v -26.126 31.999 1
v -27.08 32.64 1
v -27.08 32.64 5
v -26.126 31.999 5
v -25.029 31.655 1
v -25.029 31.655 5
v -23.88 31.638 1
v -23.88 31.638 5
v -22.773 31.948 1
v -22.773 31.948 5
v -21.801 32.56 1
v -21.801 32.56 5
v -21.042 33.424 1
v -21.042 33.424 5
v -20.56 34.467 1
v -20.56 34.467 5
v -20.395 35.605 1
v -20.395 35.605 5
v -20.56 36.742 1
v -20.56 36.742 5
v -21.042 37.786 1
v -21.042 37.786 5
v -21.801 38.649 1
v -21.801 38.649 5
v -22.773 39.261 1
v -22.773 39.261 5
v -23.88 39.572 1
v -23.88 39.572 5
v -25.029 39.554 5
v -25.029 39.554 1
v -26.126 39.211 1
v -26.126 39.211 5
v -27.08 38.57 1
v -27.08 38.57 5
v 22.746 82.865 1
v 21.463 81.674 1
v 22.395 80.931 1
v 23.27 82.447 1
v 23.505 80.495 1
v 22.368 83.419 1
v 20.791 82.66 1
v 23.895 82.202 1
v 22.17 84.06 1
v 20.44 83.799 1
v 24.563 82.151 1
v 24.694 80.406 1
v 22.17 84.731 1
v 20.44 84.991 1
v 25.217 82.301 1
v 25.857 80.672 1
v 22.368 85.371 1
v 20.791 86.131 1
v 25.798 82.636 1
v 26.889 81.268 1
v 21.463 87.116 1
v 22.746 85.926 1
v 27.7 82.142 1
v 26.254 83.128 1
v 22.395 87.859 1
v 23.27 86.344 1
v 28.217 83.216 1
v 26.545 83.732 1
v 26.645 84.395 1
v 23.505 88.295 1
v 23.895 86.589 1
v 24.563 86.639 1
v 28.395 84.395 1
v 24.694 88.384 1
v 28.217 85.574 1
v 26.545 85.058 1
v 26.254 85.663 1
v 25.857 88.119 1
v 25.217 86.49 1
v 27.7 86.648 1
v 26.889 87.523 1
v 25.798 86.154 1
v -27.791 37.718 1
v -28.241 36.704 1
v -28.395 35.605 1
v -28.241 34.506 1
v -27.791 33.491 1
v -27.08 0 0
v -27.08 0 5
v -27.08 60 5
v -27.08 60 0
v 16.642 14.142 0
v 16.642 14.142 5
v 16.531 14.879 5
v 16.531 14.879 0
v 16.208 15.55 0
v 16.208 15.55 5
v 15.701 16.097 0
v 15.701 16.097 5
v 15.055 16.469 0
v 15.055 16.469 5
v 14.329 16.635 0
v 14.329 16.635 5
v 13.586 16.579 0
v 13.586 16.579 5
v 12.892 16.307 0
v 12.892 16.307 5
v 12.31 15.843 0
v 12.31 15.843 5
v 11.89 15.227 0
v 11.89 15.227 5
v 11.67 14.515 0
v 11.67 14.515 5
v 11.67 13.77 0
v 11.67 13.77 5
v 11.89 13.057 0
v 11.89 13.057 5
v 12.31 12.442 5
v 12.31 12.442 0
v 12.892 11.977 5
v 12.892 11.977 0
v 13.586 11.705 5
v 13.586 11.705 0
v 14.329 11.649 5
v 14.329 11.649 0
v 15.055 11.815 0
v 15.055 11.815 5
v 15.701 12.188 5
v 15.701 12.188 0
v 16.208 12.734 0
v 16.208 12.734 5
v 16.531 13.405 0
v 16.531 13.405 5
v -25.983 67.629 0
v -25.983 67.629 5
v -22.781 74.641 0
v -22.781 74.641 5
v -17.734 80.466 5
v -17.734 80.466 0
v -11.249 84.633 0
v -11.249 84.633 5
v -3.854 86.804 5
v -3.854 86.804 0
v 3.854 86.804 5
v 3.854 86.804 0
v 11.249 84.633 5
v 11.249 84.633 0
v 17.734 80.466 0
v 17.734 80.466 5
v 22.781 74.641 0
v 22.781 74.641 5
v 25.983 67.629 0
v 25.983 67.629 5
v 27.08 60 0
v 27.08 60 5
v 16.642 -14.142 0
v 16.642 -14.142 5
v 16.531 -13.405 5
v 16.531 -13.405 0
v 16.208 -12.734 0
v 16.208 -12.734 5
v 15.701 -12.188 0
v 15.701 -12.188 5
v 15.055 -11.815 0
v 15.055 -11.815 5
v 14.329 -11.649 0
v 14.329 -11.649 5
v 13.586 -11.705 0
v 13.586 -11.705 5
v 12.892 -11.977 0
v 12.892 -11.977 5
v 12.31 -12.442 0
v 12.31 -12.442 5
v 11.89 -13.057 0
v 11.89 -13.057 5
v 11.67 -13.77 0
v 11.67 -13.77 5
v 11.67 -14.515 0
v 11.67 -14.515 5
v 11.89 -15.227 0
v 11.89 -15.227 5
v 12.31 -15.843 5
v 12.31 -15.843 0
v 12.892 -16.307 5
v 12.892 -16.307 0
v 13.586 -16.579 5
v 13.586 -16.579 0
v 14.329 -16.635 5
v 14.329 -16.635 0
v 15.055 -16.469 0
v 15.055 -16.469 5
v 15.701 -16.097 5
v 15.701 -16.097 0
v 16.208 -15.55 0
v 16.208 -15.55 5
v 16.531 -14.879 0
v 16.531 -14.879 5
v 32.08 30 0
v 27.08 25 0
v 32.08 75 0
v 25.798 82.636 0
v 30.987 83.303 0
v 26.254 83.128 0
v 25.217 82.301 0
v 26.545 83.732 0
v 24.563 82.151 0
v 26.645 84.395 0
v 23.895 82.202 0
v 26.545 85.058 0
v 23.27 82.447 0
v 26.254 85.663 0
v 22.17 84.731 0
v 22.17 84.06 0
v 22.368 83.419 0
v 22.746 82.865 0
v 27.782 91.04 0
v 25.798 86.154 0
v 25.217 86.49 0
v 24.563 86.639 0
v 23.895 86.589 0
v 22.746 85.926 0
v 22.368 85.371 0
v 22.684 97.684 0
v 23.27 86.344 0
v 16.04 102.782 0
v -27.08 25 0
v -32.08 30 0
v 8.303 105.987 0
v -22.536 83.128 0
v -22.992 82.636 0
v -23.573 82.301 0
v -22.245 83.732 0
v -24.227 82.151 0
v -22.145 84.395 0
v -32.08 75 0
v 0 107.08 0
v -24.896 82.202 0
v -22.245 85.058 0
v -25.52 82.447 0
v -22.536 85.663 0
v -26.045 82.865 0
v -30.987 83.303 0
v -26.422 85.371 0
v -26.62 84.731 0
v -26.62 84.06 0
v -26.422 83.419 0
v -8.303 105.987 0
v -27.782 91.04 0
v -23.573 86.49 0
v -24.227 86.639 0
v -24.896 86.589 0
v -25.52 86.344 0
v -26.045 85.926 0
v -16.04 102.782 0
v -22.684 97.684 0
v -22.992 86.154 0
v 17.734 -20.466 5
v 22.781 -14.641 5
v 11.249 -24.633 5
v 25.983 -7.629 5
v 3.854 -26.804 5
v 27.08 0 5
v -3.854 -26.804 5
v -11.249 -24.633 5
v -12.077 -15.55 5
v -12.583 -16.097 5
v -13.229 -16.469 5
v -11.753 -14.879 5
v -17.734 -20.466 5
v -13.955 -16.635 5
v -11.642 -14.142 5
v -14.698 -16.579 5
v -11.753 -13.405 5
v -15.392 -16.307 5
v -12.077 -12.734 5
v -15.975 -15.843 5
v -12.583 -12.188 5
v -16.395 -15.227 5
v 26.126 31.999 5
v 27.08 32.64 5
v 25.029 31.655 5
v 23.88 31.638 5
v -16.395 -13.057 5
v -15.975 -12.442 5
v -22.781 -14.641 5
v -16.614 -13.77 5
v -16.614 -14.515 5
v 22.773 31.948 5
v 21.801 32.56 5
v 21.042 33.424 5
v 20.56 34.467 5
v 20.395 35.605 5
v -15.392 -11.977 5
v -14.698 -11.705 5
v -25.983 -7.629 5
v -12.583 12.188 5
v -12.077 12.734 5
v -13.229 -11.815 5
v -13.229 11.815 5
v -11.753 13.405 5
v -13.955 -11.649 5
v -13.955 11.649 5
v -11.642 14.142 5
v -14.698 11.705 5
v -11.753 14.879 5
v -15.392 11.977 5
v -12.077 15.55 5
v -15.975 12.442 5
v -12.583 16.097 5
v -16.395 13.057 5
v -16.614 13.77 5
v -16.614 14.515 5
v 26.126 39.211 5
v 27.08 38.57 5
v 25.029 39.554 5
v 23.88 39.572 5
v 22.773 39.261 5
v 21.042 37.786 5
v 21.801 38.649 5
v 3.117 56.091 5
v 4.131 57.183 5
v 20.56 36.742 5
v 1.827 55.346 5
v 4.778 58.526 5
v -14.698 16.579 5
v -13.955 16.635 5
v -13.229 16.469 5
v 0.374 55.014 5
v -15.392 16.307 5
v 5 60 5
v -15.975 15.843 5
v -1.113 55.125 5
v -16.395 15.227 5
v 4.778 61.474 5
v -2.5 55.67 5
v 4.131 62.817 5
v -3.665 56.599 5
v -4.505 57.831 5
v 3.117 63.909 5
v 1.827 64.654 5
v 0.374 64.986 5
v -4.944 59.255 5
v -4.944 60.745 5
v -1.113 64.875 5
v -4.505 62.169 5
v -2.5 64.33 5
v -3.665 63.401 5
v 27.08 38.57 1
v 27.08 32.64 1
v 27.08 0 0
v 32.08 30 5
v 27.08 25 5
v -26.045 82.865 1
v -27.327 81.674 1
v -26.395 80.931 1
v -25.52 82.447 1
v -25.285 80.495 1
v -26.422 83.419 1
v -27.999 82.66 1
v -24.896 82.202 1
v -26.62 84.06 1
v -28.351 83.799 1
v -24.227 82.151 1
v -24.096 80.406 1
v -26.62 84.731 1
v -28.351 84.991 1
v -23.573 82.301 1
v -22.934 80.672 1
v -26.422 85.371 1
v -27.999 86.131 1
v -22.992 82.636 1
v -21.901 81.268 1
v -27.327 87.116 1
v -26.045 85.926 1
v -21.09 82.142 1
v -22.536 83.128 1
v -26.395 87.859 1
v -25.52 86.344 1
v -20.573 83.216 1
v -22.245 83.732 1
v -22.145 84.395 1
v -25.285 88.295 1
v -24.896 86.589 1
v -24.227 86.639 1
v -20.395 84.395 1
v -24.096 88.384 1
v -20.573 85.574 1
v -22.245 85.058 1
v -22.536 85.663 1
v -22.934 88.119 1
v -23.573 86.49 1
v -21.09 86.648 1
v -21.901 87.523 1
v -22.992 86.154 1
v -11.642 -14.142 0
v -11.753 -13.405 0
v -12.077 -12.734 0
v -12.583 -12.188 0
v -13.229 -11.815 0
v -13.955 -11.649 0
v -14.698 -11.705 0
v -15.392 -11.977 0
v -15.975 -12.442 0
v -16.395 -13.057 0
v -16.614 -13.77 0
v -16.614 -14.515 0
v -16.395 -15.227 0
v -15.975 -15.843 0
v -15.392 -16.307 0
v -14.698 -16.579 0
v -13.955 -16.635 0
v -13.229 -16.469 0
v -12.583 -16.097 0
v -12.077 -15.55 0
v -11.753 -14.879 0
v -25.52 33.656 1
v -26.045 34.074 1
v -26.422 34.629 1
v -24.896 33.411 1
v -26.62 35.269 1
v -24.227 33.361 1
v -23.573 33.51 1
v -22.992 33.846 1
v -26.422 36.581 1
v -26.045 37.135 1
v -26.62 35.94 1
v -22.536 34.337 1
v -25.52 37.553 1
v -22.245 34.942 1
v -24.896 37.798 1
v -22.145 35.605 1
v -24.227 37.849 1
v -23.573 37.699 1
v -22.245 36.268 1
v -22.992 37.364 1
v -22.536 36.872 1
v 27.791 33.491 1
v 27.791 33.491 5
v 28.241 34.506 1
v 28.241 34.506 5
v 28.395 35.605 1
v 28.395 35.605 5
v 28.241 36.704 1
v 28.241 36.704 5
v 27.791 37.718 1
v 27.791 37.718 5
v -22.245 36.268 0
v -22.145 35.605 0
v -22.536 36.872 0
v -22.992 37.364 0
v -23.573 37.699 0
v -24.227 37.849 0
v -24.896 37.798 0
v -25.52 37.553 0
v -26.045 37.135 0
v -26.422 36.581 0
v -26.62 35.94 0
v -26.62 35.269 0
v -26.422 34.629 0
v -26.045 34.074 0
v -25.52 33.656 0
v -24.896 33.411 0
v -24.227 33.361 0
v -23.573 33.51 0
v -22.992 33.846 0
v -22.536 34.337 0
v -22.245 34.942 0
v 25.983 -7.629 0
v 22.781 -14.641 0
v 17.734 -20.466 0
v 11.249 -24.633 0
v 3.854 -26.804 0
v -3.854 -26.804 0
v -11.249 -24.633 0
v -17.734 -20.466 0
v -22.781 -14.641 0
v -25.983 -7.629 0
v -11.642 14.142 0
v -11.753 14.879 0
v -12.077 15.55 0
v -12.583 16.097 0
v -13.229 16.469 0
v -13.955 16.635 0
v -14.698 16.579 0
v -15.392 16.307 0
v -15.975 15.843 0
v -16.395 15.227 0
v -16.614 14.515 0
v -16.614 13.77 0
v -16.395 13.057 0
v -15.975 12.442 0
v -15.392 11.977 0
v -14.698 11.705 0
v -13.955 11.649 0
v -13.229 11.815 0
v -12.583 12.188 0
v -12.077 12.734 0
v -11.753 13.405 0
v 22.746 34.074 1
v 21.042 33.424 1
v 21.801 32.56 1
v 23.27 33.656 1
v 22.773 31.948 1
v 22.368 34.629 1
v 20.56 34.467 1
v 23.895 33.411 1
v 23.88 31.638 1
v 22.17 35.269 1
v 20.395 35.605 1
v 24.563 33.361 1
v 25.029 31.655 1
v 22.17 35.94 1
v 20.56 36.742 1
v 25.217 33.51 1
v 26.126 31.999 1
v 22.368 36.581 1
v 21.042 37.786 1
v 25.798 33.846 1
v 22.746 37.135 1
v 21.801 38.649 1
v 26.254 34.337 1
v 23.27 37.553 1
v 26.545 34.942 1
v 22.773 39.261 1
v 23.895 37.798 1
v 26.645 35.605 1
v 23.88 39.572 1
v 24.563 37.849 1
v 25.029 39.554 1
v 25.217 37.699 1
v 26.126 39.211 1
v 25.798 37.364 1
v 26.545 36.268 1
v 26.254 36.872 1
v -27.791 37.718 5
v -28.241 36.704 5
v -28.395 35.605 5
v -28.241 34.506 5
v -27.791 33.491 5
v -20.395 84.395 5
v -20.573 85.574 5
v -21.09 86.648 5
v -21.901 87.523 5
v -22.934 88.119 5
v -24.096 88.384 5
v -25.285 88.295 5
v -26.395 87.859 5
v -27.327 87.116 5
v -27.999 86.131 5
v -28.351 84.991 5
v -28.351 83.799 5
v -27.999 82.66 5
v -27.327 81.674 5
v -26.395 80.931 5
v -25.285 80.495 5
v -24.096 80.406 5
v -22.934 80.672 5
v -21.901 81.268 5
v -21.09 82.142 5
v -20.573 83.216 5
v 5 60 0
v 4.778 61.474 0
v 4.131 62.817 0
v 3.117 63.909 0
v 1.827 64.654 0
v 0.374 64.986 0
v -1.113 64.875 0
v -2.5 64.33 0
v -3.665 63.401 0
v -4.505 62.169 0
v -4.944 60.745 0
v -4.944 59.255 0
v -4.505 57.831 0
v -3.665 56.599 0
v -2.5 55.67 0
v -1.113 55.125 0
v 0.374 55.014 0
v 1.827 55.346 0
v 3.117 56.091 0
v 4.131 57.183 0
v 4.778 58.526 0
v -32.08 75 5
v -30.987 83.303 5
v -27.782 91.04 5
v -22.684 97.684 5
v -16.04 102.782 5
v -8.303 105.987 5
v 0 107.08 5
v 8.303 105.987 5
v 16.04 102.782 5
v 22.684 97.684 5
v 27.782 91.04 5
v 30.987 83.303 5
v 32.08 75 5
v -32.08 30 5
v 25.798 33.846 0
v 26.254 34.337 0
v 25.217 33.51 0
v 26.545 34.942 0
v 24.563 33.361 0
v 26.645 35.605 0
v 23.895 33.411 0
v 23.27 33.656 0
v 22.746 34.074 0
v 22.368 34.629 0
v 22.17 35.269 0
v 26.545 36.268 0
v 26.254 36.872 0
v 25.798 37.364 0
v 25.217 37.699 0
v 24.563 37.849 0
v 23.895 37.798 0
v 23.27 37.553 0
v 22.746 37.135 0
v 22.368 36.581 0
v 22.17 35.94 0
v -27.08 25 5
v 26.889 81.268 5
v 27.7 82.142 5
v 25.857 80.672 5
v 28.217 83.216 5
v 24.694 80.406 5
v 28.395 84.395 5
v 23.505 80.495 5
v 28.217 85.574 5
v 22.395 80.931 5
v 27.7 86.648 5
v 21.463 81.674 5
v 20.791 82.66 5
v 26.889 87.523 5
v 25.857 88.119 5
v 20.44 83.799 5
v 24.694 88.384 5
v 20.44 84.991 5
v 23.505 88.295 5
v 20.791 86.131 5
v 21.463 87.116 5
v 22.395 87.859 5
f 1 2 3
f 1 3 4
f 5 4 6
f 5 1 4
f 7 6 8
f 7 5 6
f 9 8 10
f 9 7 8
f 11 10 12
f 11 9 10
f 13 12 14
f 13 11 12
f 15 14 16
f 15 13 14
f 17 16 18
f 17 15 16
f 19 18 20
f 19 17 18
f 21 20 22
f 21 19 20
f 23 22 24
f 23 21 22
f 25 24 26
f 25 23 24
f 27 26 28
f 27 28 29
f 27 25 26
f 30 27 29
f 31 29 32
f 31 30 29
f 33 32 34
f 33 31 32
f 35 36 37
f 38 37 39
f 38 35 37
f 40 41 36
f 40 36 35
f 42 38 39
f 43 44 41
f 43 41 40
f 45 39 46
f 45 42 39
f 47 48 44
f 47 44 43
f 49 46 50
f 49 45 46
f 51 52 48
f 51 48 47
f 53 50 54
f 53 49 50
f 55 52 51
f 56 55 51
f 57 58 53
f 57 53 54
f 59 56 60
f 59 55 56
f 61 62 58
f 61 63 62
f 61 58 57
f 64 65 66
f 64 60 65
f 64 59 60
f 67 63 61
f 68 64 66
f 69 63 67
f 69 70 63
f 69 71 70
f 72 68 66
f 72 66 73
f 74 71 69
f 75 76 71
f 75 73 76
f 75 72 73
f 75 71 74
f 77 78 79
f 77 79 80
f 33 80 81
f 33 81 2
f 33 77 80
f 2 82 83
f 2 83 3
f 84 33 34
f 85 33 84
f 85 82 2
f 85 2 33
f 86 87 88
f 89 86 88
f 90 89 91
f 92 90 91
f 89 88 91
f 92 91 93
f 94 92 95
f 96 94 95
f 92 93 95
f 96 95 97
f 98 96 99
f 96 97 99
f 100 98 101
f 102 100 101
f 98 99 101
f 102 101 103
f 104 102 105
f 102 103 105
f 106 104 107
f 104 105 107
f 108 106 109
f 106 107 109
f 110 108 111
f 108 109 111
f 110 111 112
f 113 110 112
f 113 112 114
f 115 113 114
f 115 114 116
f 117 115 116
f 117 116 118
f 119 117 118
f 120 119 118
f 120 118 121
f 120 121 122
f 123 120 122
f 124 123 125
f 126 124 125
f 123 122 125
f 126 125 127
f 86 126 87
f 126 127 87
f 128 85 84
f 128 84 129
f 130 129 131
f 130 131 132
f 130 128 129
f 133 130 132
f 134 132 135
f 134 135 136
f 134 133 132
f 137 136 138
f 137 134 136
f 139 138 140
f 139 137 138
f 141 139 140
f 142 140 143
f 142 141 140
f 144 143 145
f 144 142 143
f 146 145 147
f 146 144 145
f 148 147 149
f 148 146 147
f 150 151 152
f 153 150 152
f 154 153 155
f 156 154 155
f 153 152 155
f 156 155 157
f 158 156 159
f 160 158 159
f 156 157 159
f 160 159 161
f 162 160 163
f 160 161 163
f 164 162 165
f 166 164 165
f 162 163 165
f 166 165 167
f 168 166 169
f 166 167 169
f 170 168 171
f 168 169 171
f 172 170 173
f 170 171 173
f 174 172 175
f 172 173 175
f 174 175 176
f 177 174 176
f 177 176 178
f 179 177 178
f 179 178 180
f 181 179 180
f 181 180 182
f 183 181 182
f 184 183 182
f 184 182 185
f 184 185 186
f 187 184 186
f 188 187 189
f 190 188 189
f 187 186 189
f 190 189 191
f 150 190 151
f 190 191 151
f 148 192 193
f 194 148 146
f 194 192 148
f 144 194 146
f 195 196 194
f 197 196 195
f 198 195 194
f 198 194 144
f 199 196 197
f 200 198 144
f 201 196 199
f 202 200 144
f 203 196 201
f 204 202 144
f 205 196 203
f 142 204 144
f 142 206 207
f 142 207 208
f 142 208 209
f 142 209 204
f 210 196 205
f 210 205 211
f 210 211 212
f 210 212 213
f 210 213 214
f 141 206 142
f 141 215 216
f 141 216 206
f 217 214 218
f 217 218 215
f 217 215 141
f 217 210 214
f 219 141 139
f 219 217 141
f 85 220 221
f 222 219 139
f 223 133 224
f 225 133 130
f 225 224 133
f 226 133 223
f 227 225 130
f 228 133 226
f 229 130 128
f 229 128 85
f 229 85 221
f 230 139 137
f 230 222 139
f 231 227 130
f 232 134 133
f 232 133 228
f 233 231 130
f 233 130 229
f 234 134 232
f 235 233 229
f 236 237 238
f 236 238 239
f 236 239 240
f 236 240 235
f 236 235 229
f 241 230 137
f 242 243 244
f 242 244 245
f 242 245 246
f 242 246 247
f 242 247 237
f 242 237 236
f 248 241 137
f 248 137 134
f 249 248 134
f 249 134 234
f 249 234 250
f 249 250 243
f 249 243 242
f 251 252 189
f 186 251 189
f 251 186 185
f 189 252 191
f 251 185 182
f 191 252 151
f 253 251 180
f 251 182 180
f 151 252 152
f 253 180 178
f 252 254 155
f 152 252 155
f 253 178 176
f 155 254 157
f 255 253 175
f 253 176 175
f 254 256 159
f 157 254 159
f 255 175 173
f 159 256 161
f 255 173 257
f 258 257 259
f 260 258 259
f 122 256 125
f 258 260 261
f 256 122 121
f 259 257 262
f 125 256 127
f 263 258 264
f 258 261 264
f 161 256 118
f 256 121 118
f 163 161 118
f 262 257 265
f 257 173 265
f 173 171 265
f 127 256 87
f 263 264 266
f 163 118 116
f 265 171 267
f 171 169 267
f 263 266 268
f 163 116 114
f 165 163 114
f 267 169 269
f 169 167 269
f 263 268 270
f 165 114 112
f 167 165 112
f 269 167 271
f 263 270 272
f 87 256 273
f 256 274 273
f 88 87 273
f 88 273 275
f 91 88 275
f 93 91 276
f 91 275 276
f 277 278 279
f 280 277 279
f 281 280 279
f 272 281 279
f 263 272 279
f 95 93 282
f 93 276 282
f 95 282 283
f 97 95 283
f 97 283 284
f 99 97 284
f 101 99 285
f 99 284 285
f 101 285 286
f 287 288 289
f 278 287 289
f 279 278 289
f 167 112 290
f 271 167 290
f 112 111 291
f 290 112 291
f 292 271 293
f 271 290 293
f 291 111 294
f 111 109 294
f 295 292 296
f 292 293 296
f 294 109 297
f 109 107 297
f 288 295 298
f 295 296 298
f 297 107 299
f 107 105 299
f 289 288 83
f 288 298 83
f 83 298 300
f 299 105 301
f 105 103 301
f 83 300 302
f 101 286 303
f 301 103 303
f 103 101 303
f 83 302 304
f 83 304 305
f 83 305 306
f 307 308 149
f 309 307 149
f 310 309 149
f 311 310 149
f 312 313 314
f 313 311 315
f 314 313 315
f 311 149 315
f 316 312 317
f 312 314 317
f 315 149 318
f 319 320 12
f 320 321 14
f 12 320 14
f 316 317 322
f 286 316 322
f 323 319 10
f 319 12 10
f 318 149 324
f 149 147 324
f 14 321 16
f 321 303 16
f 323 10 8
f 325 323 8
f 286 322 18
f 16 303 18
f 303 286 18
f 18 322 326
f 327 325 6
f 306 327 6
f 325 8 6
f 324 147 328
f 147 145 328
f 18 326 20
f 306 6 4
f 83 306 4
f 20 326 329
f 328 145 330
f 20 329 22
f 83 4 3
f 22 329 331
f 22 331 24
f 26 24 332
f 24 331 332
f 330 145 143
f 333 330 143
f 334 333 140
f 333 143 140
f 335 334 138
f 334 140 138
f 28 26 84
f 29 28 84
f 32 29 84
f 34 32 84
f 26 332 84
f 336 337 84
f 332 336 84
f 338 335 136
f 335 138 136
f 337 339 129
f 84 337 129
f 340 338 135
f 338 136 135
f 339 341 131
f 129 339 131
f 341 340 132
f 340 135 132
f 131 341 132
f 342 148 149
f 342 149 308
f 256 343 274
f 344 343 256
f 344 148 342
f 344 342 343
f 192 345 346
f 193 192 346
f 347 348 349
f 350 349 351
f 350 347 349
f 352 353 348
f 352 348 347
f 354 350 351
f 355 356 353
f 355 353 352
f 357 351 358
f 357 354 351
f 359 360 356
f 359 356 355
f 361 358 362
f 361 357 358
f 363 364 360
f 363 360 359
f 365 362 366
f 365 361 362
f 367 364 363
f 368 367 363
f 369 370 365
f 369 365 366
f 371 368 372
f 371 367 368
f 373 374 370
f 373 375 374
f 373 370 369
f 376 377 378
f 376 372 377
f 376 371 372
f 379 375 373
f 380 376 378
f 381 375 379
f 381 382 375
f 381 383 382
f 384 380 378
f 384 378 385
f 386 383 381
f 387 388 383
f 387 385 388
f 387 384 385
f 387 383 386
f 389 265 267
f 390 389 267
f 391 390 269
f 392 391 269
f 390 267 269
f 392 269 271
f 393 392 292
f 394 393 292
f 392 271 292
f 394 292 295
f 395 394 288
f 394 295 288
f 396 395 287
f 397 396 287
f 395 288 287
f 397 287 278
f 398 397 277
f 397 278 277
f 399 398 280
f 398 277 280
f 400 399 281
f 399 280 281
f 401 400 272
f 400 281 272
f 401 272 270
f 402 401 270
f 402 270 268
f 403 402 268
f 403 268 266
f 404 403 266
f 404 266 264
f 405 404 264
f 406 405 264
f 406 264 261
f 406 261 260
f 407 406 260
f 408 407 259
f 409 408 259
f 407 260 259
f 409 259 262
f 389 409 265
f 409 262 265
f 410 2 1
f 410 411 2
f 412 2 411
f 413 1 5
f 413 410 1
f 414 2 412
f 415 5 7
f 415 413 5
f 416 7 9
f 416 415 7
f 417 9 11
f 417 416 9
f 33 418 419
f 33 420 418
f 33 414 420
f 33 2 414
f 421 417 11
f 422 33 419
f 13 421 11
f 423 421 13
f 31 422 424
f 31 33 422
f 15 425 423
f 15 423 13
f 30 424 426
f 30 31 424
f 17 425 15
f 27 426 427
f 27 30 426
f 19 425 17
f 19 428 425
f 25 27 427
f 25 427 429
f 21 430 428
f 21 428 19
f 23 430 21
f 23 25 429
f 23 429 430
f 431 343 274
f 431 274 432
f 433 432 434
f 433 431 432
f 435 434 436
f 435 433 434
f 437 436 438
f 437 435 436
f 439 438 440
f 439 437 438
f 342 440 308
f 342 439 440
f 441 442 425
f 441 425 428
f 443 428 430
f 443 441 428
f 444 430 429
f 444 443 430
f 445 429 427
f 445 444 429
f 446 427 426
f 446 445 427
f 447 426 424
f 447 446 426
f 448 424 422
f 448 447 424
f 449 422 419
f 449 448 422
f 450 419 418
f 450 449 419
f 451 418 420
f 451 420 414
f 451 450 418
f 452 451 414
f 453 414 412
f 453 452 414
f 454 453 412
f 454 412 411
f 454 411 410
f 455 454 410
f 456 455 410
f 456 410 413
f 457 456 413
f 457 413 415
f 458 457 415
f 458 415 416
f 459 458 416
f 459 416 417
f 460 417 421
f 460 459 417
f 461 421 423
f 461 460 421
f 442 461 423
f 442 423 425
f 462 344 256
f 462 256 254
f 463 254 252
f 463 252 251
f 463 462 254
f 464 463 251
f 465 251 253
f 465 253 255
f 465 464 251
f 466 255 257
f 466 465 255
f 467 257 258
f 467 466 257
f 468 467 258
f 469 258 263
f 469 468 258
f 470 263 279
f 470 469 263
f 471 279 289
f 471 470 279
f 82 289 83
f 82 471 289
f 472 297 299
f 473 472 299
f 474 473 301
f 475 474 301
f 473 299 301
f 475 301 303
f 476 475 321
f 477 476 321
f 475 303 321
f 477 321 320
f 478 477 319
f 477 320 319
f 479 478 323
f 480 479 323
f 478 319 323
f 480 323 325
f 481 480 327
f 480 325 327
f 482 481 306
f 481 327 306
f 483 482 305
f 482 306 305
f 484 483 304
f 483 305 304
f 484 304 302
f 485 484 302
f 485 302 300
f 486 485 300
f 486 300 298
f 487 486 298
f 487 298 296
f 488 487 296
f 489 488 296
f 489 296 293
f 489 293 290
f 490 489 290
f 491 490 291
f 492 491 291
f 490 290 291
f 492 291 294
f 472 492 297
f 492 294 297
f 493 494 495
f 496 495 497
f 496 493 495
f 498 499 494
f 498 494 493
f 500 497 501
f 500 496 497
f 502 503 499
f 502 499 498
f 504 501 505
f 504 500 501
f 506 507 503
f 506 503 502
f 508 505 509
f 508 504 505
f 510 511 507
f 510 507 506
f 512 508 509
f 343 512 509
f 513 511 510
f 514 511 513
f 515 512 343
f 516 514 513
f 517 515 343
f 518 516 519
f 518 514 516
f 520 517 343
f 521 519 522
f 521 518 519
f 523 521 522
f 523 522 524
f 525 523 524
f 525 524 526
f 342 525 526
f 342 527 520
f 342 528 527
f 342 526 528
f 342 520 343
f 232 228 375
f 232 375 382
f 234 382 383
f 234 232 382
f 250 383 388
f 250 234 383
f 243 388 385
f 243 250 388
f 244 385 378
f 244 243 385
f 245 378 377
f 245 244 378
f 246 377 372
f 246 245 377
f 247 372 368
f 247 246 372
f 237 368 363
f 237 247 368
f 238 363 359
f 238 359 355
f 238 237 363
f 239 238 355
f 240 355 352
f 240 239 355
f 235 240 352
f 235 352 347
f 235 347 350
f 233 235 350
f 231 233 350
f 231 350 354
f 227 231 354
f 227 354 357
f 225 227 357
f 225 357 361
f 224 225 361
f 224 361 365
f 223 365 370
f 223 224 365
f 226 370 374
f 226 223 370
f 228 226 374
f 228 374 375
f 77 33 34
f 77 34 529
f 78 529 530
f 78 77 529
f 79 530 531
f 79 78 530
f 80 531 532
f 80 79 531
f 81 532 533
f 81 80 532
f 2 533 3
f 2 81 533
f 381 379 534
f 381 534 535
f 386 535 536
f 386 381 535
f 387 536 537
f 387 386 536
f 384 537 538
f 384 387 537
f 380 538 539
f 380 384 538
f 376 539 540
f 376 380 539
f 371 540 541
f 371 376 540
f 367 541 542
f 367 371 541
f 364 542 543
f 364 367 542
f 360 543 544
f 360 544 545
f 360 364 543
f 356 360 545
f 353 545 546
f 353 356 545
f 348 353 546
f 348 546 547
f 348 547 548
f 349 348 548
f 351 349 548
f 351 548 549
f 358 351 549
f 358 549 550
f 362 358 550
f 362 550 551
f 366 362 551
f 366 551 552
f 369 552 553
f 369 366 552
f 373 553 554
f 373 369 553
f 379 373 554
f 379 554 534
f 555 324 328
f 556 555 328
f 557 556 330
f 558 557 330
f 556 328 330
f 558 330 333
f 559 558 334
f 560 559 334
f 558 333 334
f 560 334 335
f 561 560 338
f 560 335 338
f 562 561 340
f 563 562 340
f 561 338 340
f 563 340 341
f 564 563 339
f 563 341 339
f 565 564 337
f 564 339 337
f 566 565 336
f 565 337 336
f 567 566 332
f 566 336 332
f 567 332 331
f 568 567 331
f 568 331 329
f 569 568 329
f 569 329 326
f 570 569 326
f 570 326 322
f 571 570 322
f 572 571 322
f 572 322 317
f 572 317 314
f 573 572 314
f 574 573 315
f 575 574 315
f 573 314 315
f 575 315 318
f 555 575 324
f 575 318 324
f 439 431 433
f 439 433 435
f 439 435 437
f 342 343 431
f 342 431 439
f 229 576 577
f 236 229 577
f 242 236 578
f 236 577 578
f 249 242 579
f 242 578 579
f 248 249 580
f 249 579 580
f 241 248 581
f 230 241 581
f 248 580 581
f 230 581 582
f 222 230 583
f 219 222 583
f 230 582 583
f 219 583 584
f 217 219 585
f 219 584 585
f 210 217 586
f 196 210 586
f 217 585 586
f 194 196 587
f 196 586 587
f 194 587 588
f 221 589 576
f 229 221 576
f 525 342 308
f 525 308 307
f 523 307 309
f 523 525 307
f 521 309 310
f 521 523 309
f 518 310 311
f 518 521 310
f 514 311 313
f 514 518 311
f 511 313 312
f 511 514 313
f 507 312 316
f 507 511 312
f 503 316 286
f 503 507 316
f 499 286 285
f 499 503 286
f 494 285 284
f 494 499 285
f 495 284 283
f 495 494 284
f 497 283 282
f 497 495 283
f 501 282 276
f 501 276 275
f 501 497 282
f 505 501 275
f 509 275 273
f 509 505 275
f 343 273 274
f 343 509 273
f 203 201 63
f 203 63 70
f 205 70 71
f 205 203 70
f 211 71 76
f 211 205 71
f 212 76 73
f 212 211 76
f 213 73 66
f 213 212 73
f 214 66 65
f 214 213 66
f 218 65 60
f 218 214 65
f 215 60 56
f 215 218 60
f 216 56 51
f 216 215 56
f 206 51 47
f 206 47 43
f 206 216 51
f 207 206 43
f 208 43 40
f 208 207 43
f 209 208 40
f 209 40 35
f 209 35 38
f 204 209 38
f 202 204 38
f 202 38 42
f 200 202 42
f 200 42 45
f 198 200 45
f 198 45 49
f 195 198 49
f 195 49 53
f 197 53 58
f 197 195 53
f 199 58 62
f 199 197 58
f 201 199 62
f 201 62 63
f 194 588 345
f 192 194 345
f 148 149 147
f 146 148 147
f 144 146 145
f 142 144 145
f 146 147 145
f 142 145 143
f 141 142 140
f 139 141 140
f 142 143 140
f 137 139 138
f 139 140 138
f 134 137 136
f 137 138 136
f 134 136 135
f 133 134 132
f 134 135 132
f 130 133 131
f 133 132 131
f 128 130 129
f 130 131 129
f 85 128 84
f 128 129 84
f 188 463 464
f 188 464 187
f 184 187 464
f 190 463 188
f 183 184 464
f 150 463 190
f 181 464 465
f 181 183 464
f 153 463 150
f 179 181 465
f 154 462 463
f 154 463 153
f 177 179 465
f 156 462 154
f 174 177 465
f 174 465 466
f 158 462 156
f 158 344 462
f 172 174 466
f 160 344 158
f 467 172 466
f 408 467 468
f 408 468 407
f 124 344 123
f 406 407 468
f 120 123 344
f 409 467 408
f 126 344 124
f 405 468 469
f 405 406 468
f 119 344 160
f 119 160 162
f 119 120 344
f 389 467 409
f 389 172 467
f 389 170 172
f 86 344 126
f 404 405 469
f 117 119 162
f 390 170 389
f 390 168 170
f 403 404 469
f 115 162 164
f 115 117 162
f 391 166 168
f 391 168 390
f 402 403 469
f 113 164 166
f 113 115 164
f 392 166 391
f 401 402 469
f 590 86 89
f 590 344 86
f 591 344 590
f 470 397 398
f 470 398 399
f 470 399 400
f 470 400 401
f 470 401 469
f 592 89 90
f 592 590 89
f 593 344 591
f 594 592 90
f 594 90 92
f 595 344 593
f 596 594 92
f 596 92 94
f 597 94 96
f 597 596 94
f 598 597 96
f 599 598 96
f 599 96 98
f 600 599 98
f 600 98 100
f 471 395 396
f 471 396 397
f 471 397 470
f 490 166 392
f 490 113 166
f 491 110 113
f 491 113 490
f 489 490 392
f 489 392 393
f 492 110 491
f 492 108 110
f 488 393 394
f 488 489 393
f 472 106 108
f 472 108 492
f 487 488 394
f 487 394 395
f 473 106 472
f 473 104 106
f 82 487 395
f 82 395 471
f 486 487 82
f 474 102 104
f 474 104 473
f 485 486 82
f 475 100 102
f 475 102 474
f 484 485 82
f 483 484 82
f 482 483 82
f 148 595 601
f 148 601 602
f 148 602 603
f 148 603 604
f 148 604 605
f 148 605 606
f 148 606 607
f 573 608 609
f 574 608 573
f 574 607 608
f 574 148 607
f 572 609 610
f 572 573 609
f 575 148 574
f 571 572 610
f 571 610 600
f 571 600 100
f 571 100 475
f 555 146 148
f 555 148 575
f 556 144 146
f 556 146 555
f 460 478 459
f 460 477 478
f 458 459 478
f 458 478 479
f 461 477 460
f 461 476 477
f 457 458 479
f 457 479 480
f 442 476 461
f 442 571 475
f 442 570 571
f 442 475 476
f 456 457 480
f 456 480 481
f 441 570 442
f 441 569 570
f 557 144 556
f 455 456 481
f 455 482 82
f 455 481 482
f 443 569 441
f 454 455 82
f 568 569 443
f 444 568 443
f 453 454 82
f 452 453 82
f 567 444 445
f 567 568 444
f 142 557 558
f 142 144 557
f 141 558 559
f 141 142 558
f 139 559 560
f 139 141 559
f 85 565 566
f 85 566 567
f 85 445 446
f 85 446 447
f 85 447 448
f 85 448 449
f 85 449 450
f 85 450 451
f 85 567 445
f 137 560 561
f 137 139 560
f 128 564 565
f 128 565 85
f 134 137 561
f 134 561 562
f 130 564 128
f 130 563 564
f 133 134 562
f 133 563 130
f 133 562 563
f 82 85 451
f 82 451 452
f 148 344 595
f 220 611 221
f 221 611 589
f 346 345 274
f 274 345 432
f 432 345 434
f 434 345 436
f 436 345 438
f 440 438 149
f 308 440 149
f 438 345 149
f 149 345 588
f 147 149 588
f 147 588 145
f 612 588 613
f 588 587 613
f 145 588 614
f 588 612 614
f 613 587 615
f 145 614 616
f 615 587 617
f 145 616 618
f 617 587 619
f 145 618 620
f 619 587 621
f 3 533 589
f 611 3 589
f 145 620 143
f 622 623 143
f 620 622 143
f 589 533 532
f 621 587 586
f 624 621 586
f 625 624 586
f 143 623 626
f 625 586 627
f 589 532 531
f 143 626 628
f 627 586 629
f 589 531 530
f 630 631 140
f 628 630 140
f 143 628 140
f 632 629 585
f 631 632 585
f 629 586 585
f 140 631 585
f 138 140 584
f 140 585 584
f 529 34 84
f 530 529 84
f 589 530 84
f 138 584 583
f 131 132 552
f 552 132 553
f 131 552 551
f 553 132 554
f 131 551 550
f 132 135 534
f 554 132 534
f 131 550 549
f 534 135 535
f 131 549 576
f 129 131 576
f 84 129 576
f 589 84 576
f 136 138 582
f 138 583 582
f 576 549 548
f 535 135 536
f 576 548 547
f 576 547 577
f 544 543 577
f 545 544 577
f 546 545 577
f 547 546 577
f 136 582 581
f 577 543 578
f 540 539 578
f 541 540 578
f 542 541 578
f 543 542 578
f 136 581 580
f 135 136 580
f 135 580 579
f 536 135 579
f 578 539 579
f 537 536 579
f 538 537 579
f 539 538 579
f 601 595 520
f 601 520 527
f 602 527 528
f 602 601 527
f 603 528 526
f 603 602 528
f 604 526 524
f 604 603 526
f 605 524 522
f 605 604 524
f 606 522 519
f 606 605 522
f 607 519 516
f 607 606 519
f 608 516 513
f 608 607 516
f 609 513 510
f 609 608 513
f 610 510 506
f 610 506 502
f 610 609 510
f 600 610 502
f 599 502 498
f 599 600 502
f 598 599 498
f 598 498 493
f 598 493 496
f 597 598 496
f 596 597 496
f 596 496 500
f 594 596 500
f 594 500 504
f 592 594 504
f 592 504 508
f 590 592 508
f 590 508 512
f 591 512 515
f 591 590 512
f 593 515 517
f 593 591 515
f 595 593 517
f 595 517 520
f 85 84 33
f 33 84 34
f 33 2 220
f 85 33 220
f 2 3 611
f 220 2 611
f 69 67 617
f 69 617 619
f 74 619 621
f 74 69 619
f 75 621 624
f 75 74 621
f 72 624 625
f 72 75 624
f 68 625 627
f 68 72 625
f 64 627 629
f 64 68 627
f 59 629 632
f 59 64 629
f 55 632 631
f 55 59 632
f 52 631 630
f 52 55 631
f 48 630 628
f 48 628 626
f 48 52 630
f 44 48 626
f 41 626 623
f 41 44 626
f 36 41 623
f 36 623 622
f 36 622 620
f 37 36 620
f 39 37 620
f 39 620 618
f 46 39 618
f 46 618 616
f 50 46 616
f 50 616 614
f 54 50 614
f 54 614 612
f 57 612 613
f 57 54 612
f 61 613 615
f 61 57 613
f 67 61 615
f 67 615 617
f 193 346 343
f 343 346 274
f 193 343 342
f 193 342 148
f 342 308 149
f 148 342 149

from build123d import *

# Parameters (mm, degrees)
BOSS_EXTRUDE1_DEPTH            = 5
SKETCH2_R                      = 2.5
CUT_EXTRUDE1_DEPTH             = 5
SKETCH3_R                      = 5
CUT_EXTRUDE2_DEPTH             = 5
BOSS_EXTRUDE2_DEPTH            = 5
CBORE_START                    = 1
CBORE_FOR_M4_SHCS1_OUTLINE_R   = 4
CBORE_FOR_M4_SHCS1_DEPTH       = 4
CBORE_FOR_M4_SHCS1_2_OUTLINE_R = 2.25
CBORE_FOR_M4_SHCS1_2_DEPTH     = 1


# Read off the part's stored shape, not the designer's step: CBORE for M4 SHCS1
with BuildPart() as part:
    # Sketch1 → Boss-Extrude1 (new body)
    with BuildSketch(Plane.XY):
        with BuildLine():
            Line((-27.08, 0), (-27.08, 60))
            ThreePointArc((-27.08, 60), (0, 87.08), (27.08, 60))
            Line((27.08, 60), (27.08, 0))
            ThreePointArc((27.08, 0), (0, -27.08), (-27.08, 0))
        make_face()
    extrude(amount=BOSS_EXTRUDE1_DEPTH)

    # Sketch2 → Cut-Extrude1 (cut)
    with BuildSketch(Plane.XY.offset(5)):
        with Locations((14.142135624, 14.142135624)):
            Circle(SKETCH2_R)
        with Locations((14.142135624, -14.142135624)):
            Circle(SKETCH2_R)
        with Locations((-14.142135624, -14.142135624)):
            Circle(SKETCH2_R)
        with Locations((-14.142135624, 14.142135624)):
            Circle(SKETCH2_R)
    extrude(amount=-CUT_EXTRUDE1_DEPTH, mode=Mode.SUBTRACT)

    # Sketch3 → Cut-Extrude2 (cut)
    with BuildSketch(Plane.XY.offset(5)):
        with Locations((0, 60)):
            Circle(SKETCH3_R)
    extrude(amount=-CUT_EXTRUDE2_DEPTH, mode=Mode.SUBTRACT)


with BuildPart() as body_2:
    # Sketch5 → Boss-Extrude2 (new body)
    with BuildSketch(Plane.XY.offset(5)):
        with BuildLine():
            Line((-32.08, 30), (-32.08, 75))
            ThreePointArc((-32.08, 75), (0, 107.08), (32.08, 75))
            Line((32.08, 75), (32.08, 30))
            Line((32.08, 30), (27.08, 25))
            Line((27.08, 25), (27.08, 60))
            ThreePointArc((27.08, 60), (0, 87.08), (-27.08, 60))
            Line((-27.08, 60), (-27.08, 25))
            Line((-27.08, 25), (-32.08, 30))
        make_face()
    extrude(amount=-BOSS_EXTRUDE2_DEPTH)


with BuildPart() as cbore_for_m4_shcs1_tool:
    # CBORE for M4 SHCS1 outline → CBORE for M4 SHCS1 (new body)
    with BuildSketch(Plane.XY.offset(CBORE_START)):
        with BuildLine():
            ThreePointArc((-27.08, 38.569906736), (-28.395183951, 35.604816049), (-27.08, 32.639725362))
            ThreePointArc((-27.08, 32.639725362), (-20.395183951, 35.604816049), (-27.08, 38.569906736))
        make_face()
        with BuildLine():
            ThreePointArc((27.08, 32.639725362), (28.395183951, 35.604816049), (27.08, 38.569906736))
            ThreePointArc((27.08, 38.569906736), (20.395183951, 35.604816049), (27.08, 32.639725362))
        make_face()
        with Locations((24.395183951, 84.395183951)):
            Circle(CBORE_FOR_M4_SHCS1_OUTLINE_R)
        with Locations((-24.395183951, 84.395183951)):
            Circle(CBORE_FOR_M4_SHCS1_OUTLINE_R)
    extrude(amount=CBORE_FOR_M4_SHCS1_DEPTH)


with BuildPart() as part_1:
    add(part.part)

    # CBORE for M4 SHCS1: cut by cbore_for_m4_shcs1_tool
    add(cbore_for_m4_shcs1_tool.part, mode=Mode.SUBTRACT)


with BuildPart() as body_2_1:
    add(body_2.part)

    # CBORE for M4 SHCS1: cut by cbore_for_m4_shcs1_tool
    add(cbore_for_m4_shcs1_tool.part, mode=Mode.SUBTRACT)


with BuildPart() as cbore_for_m4_shcs1_2_tool:
    # CBORE for M4 SHCS1 2 outline → CBORE for M4 SHCS1 2 (new body)
    with BuildSketch(Plane.XY):
        with Locations((24.395183951, 84.395183951)):
            Circle(CBORE_FOR_M4_SHCS1_2_OUTLINE_R)
        with Locations((-24.395183951, 84.395183951)):
            Circle(CBORE_FOR_M4_SHCS1_2_OUTLINE_R)
        with Locations((-24.395183951, 35.604816049)):
            Circle(CBORE_FOR_M4_SHCS1_2_OUTLINE_R)
        with Locations((24.395183951, 35.604816049)):
            Circle(CBORE_FOR_M4_SHCS1_2_OUTLINE_R)
    extrude(amount=CBORE_FOR_M4_SHCS1_2_DEPTH)


with BuildPart() as part_2:
    add(part_1.part)

    # CBORE for M4 SHCS1 2: cut by cbore_for_m4_shcs1_2_tool
    add(cbore_for_m4_shcs1_2_tool.part, mode=Mode.SUBTRACT)


with BuildPart() as body_2_2:
    add(body_2_1.part)

    # CBORE for M4 SHCS1 2: cut by cbore_for_m4_shcs1_2_tool
    add(cbore_for_m4_shcs1_2_tool.part, mode=Mode.SUBTRACT)


solid = Compound([part_2.part, body_2_2.part])
